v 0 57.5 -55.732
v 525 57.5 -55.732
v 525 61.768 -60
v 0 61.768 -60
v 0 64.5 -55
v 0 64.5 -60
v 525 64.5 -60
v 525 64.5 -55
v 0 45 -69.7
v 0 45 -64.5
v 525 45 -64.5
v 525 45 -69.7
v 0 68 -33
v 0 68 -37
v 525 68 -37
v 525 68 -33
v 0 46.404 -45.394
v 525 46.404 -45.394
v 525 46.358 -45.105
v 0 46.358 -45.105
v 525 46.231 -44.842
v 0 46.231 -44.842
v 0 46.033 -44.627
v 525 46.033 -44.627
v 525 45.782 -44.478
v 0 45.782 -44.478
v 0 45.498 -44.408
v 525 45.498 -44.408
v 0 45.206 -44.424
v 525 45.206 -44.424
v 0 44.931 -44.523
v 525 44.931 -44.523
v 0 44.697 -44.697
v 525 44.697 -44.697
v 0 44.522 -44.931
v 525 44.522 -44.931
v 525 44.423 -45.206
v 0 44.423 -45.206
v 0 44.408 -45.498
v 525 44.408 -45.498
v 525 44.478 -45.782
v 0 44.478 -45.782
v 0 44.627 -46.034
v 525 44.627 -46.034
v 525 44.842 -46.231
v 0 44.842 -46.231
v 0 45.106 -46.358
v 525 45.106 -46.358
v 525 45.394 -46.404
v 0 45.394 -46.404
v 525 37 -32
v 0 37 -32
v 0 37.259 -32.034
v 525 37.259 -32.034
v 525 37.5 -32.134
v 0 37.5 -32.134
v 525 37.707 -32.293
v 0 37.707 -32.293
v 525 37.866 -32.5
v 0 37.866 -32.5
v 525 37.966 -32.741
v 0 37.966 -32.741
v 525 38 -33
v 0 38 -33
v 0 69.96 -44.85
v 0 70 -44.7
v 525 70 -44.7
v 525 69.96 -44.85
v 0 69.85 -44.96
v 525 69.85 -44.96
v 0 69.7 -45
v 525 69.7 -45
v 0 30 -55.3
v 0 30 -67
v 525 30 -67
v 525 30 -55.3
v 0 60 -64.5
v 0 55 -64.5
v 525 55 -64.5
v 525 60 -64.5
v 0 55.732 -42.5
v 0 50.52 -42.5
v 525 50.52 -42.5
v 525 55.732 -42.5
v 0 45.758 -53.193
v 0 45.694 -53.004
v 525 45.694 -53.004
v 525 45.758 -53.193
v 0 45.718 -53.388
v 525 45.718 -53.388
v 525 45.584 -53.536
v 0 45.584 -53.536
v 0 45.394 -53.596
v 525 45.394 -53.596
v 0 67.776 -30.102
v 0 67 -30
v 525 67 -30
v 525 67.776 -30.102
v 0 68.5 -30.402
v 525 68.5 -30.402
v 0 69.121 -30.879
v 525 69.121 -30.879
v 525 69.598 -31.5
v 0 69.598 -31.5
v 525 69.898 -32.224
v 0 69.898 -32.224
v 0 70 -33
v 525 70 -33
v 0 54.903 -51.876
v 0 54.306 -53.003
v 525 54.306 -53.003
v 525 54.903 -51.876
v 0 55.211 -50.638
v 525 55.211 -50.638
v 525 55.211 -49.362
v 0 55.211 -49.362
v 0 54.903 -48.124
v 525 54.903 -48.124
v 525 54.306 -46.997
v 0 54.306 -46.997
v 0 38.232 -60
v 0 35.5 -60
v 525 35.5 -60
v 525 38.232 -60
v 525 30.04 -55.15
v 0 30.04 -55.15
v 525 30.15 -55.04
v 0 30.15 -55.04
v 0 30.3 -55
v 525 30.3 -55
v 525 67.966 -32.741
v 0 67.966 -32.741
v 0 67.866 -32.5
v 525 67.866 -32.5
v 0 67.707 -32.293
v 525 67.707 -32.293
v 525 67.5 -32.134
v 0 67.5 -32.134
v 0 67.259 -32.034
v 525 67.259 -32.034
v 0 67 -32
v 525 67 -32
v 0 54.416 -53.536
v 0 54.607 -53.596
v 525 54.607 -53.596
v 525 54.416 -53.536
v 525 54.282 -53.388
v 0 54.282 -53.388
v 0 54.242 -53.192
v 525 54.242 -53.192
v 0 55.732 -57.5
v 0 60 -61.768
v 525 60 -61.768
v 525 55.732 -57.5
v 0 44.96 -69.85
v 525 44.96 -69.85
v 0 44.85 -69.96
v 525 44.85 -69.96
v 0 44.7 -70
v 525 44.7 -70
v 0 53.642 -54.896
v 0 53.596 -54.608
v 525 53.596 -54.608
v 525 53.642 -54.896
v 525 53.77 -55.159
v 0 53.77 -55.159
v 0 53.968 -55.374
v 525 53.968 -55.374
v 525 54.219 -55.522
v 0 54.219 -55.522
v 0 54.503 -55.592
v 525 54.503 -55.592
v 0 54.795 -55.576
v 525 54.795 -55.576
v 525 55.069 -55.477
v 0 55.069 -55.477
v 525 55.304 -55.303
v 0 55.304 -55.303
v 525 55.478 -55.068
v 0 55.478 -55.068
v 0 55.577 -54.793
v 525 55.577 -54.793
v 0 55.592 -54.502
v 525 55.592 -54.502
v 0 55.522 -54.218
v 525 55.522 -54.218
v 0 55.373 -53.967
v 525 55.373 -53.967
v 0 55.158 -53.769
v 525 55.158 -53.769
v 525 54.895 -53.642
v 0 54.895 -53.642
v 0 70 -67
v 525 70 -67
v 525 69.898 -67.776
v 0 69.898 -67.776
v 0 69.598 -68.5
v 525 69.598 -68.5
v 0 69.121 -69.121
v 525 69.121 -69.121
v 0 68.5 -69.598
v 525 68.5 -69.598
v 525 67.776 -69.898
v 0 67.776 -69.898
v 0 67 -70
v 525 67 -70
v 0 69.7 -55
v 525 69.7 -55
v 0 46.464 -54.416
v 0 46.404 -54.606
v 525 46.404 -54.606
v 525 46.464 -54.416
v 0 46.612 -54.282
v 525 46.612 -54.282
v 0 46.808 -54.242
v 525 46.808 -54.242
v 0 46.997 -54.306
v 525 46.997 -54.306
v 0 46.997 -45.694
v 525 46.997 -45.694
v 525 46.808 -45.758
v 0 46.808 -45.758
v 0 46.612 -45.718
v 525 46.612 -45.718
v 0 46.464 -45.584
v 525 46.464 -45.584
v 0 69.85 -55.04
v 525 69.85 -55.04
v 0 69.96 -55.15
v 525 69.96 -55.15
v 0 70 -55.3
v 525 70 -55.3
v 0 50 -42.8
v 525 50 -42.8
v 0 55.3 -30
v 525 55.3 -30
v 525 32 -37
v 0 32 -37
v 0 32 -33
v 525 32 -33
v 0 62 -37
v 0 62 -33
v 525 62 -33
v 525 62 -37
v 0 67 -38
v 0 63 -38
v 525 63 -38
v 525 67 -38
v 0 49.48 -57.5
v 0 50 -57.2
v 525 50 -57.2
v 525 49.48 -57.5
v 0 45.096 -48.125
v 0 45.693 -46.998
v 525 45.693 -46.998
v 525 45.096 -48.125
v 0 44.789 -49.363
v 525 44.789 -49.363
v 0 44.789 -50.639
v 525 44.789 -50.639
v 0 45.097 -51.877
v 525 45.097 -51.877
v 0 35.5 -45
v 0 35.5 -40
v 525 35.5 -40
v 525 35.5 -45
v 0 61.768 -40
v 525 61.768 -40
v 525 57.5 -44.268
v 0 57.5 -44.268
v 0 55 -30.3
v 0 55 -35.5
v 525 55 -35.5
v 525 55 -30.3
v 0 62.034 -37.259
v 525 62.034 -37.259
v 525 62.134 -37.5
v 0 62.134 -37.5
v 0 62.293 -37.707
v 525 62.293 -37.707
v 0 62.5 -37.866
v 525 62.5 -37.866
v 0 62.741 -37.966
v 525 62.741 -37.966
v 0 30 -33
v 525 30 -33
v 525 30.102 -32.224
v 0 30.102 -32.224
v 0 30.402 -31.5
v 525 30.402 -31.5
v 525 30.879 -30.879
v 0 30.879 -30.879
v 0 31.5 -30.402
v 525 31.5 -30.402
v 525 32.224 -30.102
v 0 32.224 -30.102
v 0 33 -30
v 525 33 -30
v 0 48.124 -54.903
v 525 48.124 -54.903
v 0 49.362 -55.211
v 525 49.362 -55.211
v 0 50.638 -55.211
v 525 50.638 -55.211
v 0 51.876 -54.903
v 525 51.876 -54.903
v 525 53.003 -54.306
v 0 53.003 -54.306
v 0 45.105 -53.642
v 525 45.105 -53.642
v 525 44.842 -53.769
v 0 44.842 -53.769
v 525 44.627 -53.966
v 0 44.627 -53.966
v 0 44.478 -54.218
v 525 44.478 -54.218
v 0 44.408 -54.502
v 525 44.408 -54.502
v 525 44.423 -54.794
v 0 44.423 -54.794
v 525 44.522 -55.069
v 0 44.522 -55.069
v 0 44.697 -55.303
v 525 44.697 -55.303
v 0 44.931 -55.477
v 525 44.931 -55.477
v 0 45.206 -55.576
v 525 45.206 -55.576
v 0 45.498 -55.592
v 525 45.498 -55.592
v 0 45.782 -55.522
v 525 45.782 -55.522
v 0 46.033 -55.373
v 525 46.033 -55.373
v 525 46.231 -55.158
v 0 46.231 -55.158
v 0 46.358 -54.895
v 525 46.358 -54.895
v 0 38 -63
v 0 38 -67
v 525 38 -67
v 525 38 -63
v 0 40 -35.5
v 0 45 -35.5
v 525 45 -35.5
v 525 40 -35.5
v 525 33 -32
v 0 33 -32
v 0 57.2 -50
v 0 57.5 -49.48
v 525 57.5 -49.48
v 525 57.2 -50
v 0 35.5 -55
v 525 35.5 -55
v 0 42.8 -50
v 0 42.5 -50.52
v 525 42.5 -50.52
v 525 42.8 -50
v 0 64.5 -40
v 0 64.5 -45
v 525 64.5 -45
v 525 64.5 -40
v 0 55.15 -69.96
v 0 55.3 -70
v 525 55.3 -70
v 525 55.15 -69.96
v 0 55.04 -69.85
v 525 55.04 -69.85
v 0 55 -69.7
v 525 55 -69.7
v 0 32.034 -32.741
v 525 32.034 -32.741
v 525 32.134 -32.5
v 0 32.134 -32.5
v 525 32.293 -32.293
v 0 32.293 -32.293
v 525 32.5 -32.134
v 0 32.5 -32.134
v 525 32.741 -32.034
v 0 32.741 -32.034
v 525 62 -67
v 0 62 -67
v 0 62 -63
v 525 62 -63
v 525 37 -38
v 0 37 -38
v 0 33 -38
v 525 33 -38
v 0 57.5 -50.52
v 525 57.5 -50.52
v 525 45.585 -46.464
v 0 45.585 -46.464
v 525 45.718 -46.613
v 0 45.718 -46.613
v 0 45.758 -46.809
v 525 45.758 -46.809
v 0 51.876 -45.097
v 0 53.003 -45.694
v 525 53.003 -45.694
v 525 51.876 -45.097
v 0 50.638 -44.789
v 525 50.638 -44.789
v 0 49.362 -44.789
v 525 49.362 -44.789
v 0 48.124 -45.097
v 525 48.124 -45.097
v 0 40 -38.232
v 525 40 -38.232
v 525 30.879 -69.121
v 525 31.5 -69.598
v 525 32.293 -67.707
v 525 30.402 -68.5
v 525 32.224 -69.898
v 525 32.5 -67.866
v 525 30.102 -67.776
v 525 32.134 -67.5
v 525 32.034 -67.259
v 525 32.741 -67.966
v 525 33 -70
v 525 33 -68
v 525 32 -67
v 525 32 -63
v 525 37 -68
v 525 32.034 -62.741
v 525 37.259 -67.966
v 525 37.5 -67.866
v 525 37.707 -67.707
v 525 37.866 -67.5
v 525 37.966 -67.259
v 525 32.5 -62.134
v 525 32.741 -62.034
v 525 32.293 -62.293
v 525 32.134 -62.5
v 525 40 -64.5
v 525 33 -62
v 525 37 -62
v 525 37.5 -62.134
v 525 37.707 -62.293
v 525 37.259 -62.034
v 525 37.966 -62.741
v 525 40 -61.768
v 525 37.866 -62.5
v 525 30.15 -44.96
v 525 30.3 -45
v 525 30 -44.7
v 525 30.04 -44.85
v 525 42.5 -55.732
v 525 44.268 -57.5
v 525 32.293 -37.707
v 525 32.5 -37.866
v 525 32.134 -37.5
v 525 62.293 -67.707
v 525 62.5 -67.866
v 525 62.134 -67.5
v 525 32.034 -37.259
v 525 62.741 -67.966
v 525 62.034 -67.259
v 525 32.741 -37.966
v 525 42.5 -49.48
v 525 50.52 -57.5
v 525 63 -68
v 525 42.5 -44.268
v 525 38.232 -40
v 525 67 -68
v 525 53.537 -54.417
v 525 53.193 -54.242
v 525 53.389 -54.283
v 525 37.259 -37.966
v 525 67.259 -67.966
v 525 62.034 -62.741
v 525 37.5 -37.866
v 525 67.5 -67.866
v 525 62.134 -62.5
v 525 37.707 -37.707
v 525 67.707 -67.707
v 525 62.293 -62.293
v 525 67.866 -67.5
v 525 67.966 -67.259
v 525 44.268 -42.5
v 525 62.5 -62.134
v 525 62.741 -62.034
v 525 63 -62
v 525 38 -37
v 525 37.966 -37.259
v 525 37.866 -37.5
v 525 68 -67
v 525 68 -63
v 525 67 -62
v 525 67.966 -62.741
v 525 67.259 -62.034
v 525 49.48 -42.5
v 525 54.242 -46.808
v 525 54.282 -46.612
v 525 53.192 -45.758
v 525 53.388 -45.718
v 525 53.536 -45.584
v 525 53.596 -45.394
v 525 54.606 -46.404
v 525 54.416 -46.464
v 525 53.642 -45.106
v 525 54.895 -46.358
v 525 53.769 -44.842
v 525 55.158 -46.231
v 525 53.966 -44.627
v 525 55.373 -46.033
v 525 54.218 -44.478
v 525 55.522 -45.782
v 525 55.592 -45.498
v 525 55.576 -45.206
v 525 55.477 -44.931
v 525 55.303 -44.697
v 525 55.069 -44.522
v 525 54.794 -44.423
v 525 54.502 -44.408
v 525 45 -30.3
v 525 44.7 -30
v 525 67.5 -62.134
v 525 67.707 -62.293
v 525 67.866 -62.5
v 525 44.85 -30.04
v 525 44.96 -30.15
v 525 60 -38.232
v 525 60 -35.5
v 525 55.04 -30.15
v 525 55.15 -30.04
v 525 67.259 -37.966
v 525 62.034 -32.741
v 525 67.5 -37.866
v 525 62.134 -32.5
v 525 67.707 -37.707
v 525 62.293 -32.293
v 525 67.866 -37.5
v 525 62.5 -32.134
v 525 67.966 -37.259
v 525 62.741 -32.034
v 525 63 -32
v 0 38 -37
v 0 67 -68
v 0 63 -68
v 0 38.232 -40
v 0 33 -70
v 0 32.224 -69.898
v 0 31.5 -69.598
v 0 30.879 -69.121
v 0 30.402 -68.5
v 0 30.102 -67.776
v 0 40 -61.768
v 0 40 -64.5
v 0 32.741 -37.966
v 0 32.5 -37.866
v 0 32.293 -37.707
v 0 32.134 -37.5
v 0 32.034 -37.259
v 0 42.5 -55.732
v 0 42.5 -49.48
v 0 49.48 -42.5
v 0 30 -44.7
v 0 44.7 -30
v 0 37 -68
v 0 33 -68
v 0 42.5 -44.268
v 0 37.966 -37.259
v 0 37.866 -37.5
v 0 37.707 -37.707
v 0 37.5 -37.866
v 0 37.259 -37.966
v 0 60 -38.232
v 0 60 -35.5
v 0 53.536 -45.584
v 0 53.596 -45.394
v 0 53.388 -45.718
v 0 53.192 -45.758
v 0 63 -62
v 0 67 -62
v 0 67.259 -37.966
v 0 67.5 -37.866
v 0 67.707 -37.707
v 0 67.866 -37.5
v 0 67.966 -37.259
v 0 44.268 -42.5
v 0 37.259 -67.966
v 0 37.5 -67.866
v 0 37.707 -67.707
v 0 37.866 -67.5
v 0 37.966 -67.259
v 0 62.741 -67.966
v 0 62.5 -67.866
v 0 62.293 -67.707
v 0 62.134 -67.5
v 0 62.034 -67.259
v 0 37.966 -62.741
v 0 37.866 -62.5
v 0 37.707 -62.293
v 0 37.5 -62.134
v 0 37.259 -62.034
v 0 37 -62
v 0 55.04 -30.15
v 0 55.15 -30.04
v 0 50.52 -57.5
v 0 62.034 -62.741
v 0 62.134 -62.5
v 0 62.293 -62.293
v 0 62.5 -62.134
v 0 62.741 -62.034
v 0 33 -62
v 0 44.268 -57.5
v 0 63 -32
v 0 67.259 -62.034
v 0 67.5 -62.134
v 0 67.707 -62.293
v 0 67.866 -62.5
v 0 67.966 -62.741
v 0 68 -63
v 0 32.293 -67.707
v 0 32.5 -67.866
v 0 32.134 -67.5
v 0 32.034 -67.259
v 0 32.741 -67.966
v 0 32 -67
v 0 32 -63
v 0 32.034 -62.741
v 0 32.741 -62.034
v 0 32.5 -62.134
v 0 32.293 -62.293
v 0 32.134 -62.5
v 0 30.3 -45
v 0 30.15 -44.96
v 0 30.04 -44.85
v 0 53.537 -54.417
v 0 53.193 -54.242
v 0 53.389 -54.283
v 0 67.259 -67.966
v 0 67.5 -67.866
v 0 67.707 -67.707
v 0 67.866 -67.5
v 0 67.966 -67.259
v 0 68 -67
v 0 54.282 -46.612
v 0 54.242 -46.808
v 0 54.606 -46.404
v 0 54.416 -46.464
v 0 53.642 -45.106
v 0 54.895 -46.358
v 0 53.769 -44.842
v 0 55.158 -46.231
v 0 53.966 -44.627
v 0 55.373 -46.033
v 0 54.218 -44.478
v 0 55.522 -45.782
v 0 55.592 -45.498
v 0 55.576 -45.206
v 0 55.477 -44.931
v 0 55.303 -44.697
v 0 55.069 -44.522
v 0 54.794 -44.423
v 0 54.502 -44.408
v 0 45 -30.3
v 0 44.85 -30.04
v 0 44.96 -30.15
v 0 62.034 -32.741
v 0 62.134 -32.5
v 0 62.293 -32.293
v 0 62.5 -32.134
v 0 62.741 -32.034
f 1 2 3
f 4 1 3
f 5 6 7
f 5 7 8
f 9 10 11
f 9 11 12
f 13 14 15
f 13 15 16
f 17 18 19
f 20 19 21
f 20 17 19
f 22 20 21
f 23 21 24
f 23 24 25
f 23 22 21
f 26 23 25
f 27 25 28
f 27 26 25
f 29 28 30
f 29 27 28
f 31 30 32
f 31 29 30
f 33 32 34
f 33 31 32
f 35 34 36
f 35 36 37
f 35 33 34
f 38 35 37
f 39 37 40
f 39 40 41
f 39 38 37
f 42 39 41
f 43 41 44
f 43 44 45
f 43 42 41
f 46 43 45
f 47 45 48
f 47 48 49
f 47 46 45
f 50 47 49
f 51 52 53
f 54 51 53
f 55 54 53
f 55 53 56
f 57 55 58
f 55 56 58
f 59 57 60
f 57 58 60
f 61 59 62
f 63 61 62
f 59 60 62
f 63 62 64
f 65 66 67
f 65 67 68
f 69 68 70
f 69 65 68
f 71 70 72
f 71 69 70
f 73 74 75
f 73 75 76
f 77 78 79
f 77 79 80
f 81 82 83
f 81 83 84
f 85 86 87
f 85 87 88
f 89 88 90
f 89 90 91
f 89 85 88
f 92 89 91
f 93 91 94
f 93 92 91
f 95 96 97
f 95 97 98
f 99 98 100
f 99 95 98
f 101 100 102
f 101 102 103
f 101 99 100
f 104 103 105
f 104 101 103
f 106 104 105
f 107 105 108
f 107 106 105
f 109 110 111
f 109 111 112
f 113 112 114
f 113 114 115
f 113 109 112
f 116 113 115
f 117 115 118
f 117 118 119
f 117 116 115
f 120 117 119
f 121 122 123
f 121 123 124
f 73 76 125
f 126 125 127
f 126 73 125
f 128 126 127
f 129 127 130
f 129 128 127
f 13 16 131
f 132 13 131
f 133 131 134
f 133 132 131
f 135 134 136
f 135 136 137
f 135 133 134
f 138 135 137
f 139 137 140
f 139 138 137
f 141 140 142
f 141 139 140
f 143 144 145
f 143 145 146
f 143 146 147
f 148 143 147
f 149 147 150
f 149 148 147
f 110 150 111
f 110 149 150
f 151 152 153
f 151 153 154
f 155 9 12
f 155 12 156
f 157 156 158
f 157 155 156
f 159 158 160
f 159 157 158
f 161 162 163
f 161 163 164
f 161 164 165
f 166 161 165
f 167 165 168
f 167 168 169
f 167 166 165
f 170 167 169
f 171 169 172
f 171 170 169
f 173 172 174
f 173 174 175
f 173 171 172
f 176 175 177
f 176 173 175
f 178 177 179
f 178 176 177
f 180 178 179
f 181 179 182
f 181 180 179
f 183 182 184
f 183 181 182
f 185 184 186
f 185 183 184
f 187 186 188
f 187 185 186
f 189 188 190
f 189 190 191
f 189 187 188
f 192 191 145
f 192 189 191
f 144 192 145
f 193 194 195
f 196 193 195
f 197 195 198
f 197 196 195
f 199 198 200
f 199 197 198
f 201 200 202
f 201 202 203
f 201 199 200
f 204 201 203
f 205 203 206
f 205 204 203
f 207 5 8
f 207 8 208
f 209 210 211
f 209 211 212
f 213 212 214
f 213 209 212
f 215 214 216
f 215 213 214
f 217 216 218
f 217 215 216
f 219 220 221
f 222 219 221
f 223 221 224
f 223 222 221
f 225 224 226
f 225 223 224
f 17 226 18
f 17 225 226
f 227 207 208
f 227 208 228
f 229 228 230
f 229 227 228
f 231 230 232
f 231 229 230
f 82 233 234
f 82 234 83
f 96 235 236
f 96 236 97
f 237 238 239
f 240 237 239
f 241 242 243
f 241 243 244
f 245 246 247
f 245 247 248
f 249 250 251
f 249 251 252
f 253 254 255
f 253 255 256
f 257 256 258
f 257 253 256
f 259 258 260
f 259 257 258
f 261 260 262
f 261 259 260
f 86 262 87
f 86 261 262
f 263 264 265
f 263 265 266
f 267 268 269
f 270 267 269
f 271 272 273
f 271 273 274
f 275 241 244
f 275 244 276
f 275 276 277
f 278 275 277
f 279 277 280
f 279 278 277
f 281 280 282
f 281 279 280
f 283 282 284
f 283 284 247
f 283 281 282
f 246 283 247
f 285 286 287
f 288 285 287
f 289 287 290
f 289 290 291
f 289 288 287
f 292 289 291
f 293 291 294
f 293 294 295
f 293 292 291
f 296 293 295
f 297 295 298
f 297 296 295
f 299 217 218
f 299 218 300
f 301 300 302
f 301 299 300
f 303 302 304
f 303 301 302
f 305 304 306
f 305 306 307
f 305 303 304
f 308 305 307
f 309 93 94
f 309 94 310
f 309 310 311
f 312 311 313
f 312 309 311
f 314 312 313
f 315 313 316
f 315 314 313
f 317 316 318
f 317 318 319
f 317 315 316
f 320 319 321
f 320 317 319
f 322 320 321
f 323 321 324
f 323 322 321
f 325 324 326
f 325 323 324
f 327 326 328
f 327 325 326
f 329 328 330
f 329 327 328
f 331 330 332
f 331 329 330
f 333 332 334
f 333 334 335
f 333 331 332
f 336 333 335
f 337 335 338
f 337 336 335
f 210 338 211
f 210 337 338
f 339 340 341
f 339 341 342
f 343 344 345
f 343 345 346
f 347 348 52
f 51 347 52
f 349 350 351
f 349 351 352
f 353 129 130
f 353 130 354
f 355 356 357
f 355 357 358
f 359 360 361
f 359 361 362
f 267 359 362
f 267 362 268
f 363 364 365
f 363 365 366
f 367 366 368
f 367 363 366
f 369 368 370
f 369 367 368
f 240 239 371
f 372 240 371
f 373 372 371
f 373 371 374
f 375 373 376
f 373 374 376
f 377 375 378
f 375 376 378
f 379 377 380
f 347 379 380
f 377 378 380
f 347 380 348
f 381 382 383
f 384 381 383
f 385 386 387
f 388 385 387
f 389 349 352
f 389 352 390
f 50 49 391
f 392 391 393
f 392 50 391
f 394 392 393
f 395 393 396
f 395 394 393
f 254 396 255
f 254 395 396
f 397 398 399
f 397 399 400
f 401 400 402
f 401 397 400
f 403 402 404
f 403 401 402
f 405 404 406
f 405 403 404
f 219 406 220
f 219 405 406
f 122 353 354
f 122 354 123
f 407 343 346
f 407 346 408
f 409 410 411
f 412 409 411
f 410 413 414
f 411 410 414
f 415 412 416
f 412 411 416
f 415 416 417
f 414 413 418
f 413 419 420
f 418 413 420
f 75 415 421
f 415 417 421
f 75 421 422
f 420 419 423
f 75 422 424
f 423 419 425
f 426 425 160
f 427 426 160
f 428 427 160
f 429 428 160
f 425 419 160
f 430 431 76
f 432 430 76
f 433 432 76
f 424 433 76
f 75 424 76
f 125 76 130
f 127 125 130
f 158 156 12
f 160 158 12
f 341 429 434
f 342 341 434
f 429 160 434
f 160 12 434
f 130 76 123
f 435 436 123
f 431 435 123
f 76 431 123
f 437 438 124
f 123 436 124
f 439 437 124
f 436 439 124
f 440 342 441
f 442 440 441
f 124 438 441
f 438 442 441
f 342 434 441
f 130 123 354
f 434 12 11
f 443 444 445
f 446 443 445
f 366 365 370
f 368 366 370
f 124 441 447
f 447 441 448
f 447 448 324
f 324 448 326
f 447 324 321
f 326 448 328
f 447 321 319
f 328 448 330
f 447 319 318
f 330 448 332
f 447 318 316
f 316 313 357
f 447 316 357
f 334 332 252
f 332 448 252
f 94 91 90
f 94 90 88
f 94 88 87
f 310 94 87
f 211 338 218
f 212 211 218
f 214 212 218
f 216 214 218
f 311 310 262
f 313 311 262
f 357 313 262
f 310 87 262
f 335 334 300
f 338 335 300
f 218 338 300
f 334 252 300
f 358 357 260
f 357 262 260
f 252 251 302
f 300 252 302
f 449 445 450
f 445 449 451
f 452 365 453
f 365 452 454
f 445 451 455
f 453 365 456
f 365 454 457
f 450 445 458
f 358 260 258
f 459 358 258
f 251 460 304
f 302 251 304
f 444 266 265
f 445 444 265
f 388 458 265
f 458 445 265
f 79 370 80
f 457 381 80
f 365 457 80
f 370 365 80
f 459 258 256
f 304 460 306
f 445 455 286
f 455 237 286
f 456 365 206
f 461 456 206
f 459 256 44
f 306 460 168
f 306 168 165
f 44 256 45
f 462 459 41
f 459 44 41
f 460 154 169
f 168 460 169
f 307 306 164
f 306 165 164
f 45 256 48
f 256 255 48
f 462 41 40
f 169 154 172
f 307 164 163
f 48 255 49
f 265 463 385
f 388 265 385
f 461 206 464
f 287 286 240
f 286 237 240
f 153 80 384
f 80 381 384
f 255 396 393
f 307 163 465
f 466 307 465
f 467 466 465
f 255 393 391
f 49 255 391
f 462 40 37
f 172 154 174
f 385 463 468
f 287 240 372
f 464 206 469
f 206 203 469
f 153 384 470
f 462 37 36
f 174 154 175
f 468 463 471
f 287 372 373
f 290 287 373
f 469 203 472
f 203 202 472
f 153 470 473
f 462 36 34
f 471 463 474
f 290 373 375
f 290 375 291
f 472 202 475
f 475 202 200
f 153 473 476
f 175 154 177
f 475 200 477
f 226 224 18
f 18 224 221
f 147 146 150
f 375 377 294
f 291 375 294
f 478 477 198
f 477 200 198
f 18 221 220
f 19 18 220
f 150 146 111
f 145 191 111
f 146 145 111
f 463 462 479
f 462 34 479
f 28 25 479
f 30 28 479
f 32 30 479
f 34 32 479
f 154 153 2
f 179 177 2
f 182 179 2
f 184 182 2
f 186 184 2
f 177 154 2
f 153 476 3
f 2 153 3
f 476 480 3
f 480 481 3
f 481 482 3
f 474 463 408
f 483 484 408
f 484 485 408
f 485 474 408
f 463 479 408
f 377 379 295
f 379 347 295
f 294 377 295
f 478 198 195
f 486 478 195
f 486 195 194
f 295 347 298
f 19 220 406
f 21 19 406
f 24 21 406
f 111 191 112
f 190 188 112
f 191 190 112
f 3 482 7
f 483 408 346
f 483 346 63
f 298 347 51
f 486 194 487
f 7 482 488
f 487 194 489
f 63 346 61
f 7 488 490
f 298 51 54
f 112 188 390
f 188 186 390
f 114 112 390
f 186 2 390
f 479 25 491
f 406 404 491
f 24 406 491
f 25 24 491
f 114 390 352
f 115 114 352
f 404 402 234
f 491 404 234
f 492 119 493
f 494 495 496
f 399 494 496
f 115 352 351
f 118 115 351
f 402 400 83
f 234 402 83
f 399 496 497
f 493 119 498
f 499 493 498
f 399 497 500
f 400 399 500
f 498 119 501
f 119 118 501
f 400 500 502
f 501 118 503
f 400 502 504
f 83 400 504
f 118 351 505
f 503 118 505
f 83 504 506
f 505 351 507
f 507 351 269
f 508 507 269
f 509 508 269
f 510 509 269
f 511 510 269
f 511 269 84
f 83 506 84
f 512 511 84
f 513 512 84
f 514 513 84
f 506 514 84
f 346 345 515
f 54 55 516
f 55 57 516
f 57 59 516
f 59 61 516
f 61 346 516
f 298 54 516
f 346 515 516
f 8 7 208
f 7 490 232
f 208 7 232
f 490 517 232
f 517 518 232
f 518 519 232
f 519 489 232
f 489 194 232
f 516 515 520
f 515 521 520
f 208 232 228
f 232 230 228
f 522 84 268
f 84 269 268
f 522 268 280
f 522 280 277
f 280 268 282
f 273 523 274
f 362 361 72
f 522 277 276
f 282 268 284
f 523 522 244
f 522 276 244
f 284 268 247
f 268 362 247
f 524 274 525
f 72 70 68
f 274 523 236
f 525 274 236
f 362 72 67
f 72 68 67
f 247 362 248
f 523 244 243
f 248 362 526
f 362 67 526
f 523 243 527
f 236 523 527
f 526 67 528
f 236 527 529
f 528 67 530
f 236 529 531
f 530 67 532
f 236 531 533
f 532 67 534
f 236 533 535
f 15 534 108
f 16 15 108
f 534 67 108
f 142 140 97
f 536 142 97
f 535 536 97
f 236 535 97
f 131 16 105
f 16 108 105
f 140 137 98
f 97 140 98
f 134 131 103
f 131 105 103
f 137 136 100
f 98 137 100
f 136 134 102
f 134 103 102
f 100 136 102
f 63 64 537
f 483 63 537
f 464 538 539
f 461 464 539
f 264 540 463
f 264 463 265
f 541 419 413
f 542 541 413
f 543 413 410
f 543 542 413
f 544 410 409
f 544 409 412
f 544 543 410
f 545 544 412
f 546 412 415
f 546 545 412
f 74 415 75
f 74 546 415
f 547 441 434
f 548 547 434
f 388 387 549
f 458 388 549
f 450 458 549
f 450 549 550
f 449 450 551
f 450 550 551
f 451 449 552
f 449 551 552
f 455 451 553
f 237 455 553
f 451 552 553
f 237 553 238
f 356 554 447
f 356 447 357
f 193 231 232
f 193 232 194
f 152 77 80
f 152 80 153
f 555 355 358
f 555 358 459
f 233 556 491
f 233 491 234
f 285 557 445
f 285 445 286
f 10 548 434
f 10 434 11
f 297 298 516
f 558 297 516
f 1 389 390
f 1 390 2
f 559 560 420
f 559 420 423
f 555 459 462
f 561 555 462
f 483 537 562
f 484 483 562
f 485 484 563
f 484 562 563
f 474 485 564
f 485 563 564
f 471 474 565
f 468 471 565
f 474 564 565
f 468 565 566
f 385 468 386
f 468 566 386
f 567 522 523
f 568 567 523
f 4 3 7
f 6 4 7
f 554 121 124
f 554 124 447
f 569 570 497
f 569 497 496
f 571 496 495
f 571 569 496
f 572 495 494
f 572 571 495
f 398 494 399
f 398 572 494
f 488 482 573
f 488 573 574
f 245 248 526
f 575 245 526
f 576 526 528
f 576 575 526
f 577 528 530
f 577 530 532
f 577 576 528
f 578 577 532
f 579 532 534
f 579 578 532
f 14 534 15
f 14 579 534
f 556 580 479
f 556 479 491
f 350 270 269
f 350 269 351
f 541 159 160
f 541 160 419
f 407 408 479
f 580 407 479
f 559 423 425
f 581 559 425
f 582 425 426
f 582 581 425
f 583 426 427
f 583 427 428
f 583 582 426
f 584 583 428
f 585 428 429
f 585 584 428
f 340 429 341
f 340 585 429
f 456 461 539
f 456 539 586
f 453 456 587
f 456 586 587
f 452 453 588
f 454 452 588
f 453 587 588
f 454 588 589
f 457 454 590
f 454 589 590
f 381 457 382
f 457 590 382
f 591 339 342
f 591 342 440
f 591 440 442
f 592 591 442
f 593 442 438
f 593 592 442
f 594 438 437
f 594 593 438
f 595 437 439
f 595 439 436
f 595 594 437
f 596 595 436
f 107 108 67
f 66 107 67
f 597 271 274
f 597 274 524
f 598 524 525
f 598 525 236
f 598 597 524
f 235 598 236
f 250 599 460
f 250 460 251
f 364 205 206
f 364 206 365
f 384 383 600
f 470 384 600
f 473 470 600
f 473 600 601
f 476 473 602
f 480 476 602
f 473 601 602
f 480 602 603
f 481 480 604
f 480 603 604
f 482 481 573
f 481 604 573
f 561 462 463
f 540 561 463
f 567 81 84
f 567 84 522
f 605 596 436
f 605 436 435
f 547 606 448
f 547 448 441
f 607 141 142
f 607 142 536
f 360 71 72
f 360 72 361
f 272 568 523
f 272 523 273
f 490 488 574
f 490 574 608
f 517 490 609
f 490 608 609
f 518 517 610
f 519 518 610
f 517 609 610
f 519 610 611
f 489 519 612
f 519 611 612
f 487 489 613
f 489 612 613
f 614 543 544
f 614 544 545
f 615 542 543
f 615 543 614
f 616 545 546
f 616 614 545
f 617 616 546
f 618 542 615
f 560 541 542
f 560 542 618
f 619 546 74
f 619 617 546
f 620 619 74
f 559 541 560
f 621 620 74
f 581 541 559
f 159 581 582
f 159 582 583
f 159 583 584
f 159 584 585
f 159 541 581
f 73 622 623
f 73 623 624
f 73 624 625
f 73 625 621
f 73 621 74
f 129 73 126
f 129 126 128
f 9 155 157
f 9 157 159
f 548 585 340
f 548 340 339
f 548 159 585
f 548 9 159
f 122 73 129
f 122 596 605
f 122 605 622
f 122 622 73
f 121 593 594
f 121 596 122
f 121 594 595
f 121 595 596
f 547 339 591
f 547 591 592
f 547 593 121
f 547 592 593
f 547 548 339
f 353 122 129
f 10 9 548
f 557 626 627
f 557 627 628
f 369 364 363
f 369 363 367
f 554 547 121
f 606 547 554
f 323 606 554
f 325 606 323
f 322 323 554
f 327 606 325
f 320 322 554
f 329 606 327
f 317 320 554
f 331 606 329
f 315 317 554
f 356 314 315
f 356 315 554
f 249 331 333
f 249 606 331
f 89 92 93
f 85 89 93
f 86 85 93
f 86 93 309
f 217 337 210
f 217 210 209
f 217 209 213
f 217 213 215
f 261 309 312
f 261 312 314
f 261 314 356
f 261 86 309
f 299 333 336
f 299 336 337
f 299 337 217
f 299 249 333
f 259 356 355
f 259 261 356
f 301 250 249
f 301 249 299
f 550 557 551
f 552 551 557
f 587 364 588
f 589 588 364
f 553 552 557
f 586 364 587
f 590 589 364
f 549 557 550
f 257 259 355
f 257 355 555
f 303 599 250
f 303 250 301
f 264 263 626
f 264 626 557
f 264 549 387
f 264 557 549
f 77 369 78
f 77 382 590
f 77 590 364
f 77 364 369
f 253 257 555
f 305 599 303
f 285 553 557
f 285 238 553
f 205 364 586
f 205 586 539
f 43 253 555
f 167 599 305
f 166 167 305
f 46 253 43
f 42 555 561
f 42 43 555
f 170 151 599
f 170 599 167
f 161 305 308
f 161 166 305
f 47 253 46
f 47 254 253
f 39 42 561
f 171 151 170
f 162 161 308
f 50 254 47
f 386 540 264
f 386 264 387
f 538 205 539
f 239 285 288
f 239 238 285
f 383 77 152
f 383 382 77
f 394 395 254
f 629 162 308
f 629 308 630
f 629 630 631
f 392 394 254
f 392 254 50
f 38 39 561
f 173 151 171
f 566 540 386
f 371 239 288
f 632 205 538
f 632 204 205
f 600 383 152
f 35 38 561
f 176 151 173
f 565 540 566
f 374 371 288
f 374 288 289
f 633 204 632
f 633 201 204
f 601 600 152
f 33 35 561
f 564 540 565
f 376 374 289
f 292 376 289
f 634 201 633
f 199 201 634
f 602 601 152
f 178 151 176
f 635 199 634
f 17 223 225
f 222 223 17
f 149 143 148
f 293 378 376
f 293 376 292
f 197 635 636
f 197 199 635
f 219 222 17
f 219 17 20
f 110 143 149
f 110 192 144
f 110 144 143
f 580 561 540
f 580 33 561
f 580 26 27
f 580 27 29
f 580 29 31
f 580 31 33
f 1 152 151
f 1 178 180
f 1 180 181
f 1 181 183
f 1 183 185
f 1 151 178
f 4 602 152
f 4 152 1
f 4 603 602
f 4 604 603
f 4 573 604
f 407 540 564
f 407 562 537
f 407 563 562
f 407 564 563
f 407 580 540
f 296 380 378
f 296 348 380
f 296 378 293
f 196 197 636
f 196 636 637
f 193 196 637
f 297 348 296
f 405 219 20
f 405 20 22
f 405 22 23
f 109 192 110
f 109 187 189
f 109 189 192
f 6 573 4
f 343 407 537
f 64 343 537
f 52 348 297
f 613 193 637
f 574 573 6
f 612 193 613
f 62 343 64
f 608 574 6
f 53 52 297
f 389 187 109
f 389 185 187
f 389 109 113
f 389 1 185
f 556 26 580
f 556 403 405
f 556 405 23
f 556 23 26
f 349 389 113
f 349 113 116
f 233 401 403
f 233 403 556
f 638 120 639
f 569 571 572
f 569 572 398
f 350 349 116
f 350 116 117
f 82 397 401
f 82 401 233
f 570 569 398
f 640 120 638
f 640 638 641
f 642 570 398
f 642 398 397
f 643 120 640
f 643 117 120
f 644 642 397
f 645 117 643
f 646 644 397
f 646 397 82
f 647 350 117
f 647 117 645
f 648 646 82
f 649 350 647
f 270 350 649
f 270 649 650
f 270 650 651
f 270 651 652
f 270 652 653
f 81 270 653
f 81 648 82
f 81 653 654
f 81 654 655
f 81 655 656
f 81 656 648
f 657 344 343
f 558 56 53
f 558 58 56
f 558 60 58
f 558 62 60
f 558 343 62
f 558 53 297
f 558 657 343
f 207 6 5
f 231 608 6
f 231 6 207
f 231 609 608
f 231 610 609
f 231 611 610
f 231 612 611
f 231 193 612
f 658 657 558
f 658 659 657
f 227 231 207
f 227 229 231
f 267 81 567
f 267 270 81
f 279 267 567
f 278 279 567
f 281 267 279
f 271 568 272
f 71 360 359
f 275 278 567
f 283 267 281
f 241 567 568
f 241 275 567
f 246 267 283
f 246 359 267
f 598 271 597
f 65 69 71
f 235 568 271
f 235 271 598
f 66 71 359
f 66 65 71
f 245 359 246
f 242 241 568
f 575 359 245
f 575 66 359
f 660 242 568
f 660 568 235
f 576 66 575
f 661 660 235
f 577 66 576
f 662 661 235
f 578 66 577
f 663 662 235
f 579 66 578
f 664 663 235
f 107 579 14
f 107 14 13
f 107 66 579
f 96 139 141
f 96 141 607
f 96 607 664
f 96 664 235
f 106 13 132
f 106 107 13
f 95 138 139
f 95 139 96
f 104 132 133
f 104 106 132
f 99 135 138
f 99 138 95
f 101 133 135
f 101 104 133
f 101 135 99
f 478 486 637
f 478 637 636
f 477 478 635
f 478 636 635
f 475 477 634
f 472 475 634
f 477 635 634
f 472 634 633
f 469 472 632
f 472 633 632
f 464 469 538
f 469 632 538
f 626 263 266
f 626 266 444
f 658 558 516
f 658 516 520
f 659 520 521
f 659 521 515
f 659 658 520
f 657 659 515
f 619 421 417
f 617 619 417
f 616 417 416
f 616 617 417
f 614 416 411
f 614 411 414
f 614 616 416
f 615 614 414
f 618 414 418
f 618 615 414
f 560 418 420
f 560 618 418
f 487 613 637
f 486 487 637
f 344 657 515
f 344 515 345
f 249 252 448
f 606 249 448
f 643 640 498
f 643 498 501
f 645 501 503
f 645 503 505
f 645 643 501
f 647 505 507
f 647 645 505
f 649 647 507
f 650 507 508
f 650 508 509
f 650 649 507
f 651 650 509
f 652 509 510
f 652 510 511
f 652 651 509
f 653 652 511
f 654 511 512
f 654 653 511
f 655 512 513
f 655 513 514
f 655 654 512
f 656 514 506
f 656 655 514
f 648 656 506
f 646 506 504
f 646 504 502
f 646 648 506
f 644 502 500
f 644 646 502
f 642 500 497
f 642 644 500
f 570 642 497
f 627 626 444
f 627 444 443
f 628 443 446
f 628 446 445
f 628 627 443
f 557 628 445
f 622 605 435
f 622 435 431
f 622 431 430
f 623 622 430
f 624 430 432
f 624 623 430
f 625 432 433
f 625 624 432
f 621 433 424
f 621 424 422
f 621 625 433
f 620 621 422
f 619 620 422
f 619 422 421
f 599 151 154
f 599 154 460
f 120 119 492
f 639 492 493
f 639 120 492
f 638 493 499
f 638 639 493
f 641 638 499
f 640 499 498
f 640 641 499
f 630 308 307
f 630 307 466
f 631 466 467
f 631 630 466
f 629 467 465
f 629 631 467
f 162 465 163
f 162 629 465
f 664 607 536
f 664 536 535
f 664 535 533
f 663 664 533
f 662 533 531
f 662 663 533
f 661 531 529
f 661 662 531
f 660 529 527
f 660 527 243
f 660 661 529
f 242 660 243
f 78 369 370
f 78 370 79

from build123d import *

# Parameters (mm, degrees)
STRUCTURAL_MEMBER2_DEPTH = 525


with BuildPart() as part:
    # Profile → Structural Member2 (new body)
    with BuildSketch(Plane(origin=(0, 0, 0), x_dir=(0, 0, -1), z_dir=(1, 0, 0))):
        with BuildLine():
            Line((69.699997, 55), (64.5, 55))
            Line((64.5, 55), (64.5, 60))
            Line((64.5, 60), (61.767777, 60))
            Line((61.767777, 60), (57.5, 55.732231))
            Line((57.5, 55.732231), (57.5, 50.519615242))
            Line((57.5, 50.519615242), (57.2, 50))
            Line((57.2, 50), (57.5, 49.480384758))
            Line((57.5, 49.480384758), (57.5, 44.26777))
            Line((57.5, 44.26777), (61.767777, 39.999999))
            Line((61.767777, 39.999999), (64.5, 40))
            Line((64.5, 40), (64.5, 45))
            Line((64.5, 45), (69.699997, 45))
            ThreePointArc((69.699997, 45), (69.912132034, 44.912132034), (70, 44.699997))
            Line((70, 44.699997), (70, 33))
            ThreePointArc((70, 33), (69.121320344, 30.878679656), (67, 30))
            Line((67, 30), (55.3, 30))
            ThreePointArc((55.3, 30), (55.087867966, 30.087867966), (55, 30.3))
            Line((55, 30.3), (55, 35.5))
            Line((55, 35.5), (60, 35.5))
            Line((60, 35.5), (60.000008, 38.232225))
            Line((60.000008, 38.232225), (55.732238, 42.5))
            Line((55.732238, 42.5), (50.519615242, 42.5))
            Line((50.519615242, 42.5), (50, 42.8))
            Line((50, 42.8), (49.480384758, 42.5))
            Line((49.480384758, 42.5), (44.26777, 42.5))
            Line((44.26777, 42.5), (40, 38.23223))
            Line((40, 38.23223), (40, 35.5))
            Line((40, 35.5), (45, 35.5))
            Line((45, 35.5), (45, 30.3))
            ThreePointArc((45, 30.3), (44.912130974, 30.087866905), (44.699997, 30))
            Line((44.699997, 30), (33, 30))
            ThreePointArc((33, 30), (30.878679656, 30.878679656), (30, 33))
            Line((30, 33), (30, 44.699997))
            ThreePointArc((30, 44.699997), (30.087867966, 44.912132034), (30.300003, 45))
            Line((30.300003, 45), (35.5, 45))
            Line((35.5, 45), (35.5, 40.000006))
            Line((35.5, 40.000006), (38.232224, 40.000006))
            Line((38.232224, 40.000006), (42.5, 44.267753))
            Line((42.5, 44.267753), (42.5, 49.480384758))
            Line((42.5, 49.480384758), (42.8, 50))
            Line((42.8, 50), (42.5, 50.519615242))
            Line((42.5, 50.519615242), (42.5, 55.732248))
            Line((42.5, 55.732248), (38.232231, 60.000001))
            Line((38.232231, 60.000001), (35.5, 60))
            Line((35.5, 60), (35.5, 55))
            Line((35.5, 55), (30.300003, 55))
            ThreePointArc((30.300003, 55), (30.087867966, 55.087867966), (30, 55.300003))
            Line((30, 55.300003), (30, 67.000001))
            ThreePointArc((30, 67.000001), (30.87868001, 69.121320697), (33, 70))
            Line((33, 70), (44.699997, 70))
            ThreePointArc((44.699997, 70), (44.912130974, 69.912133095), (45, 69.7))
            Line((45, 69.7), (45, 64.5))
            Line((45, 64.5), (40, 64.5))
            Line((40, 64.5), (40, 61.767771))
            Line((40, 61.767771), (44.267771, 57.5))
            Line((44.267771, 57.5), (49.480384758, 57.5))
            Line((49.480384758, 57.5), (50, 57.2))
            Line((50, 57.2), (50.519615242, 57.5))
            Line((50.519615242, 57.5), (55.732237, 57.5))
            Line((55.732237, 57.5), (60.000008, 61.767771))
            Line((60.000008, 61.767771), (60, 64.5))
            Line((60, 64.5), (55, 64.5))
            Line((55, 64.5), (55, 69.7))
            ThreePointArc((55, 69.7), (55.087867966, 69.912132034), (55.3, 70))
            Line((55.3, 70), (67, 70))
            ThreePointArc((67, 70), (69.12131999, 69.121320697), (70, 67.000001))
            Line((70, 67.000001), (70, 55.300003))
            ThreePointArc((70, 55.300003), (69.912132034, 55.087867966), (69.699997, 55))
        make_face()
        with BuildLine():
            Line((37, 68), (33, 68))
            ThreePointArc((33, 68), (32.292893219, 67.707106781), (32, 67))
            Line((32, 67), (32, 63))
            ThreePointArc((32, 63), (32.292893219, 62.292893219), (33, 62))
            Line((33, 62), (37, 62))
            ThreePointArc((37, 62), (37.707106781, 62.292893219), (38, 63))
            Line((38, 63), (38, 67))
            ThreePointArc((38, 67), (37.707106781, 67.707106781), (37, 68))
        make_face(mode=Mode.SUBTRACT)
        with BuildLine():
            Line((68, 67), (68, 63))
            ThreePointArc((68, 63), (67.707106781, 62.292893219), (67, 62))
            Line((67, 62), (62.999985, 62))
            ThreePointArc((62.999985, 62), (62.29288933, 62.292897108), (62, 62.999996))
            Line((62, 62.999996), (62, 67))
            ThreePointArc((62, 67), (62.292893219, 67.707106781), (63, 68))
            Line((63, 68), (67, 68))
            ThreePointArc((67, 68), (67.707106781, 67.707106781), (68, 67))
        make_face(mode=Mode.SUBTRACT)
        with BuildLine():
            Line((68, 33), (68, 37.000001))
            ThreePointArc((68, 37.000001), (67.707106781, 37.707107781), (67, 38.000001))
            Line((67, 38.000001), (63, 38.000001))
            ThreePointArc((63, 38.000001), (62.292893219, 37.707107781), (62, 37.000001))
            Line((62, 37.000001), (62, 33))
            ThreePointArc((62, 33), (62.292893219, 32.292893219), (63, 32))
            Line((63, 32), (67, 32))
            ThreePointArc((67, 32), (67.707106781, 32.292893219), (68, 33))
        make_face(mode=Mode.SUBTRACT)
        with BuildLine():
            Line((33, 38), (37.000015, 38))
            ThreePointArc((37.000015, 38), (37.707114206, 37.707099357), (38, 36.999994))
            Line((38, 36.999994), (38, 33))
            ThreePointArc((38, 33), (37.707106781, 32.292893219), (37, 32))
            Line((37, 32), (33, 32))
            ThreePointArc((33, 32), (32.292893219, 32.292893219), (32, 33))
            Line((32, 33), (32, 37))
            ThreePointArc((32, 37), (32.292893219, 37.707106781), (33, 38))
        make_face(mode=Mode.SUBTRACT)
        with BuildLine():
            ThreePointArc((45.693983688, 53.003451934), (44.75, 50.000006422), (45.69397634, 46.996558601))
            ThreePointArc((45.69397634, 46.996558601), (45.717617411, 46.612262817), (45.393937878, 46.403759319))
            ThreePointArc((45.393937878, 46.403759319), (44.696798004, 44.696601447), (46.403759064, 45.394223081))
            ThreePointArc((46.403759064, 45.394223081), (46.613183993, 45.71810041), (46.998050321, 45.692936253))
            ThreePointArc((46.998050321, 45.692936253), (50.001173377, 44.750000131), (53.00387464, 45.694278557))
            ThreePointArc((53.00387464, 45.694278557), (53.38786573, 45.717565842), (53.596237266, 45.39418873))
            ThreePointArc((53.596237266, 45.39418873), (55.303208824, 44.696612273), (54.60606185, 46.403759282))
            ThreePointArc((54.60606185, 46.403759282), (54.2823423, 46.612342937), (54.306127195, 46.996707043))
            ThreePointArc((54.306127195, 46.996707043), (55.25, 50.000037648), (54.306084121, 53.003354715))
            ThreePointArc((54.306084121, 53.003354715), (54.28277906, 53.388519532), (54.607953771, 53.596260884))
            ThreePointArc((54.607953771, 53.596260884), (55.30278657, 55.303809323), (53.596244226, 54.606509157))
            ThreePointArc((53.596244226, 54.606509157), (53.387865247, 54.28245073), (53.003318835, 54.306109146))
            ThreePointArc((53.003318835, 54.306109146), (50.000075464, 55.249999999), (46.996804959, 54.306195484))
            ThreePointArc((46.996804959, 54.306195484), (46.612495539, 54.2822647), (46.403758539, 54.605831196))
            ThreePointArc((46.403758539, 54.605831196), (44.696618996, 55.30321925), (45.394389581, 53.596236026))
            ThreePointArc((45.394389581, 53.596236026), (45.717718991, 53.387547534), (45.693983688, 53.003451934))
        make_face(mode=Mode.SUBTRACT)
    extrude(amount=STRUCTURAL_MEMBER2_DEPTH)


solid = part.part
